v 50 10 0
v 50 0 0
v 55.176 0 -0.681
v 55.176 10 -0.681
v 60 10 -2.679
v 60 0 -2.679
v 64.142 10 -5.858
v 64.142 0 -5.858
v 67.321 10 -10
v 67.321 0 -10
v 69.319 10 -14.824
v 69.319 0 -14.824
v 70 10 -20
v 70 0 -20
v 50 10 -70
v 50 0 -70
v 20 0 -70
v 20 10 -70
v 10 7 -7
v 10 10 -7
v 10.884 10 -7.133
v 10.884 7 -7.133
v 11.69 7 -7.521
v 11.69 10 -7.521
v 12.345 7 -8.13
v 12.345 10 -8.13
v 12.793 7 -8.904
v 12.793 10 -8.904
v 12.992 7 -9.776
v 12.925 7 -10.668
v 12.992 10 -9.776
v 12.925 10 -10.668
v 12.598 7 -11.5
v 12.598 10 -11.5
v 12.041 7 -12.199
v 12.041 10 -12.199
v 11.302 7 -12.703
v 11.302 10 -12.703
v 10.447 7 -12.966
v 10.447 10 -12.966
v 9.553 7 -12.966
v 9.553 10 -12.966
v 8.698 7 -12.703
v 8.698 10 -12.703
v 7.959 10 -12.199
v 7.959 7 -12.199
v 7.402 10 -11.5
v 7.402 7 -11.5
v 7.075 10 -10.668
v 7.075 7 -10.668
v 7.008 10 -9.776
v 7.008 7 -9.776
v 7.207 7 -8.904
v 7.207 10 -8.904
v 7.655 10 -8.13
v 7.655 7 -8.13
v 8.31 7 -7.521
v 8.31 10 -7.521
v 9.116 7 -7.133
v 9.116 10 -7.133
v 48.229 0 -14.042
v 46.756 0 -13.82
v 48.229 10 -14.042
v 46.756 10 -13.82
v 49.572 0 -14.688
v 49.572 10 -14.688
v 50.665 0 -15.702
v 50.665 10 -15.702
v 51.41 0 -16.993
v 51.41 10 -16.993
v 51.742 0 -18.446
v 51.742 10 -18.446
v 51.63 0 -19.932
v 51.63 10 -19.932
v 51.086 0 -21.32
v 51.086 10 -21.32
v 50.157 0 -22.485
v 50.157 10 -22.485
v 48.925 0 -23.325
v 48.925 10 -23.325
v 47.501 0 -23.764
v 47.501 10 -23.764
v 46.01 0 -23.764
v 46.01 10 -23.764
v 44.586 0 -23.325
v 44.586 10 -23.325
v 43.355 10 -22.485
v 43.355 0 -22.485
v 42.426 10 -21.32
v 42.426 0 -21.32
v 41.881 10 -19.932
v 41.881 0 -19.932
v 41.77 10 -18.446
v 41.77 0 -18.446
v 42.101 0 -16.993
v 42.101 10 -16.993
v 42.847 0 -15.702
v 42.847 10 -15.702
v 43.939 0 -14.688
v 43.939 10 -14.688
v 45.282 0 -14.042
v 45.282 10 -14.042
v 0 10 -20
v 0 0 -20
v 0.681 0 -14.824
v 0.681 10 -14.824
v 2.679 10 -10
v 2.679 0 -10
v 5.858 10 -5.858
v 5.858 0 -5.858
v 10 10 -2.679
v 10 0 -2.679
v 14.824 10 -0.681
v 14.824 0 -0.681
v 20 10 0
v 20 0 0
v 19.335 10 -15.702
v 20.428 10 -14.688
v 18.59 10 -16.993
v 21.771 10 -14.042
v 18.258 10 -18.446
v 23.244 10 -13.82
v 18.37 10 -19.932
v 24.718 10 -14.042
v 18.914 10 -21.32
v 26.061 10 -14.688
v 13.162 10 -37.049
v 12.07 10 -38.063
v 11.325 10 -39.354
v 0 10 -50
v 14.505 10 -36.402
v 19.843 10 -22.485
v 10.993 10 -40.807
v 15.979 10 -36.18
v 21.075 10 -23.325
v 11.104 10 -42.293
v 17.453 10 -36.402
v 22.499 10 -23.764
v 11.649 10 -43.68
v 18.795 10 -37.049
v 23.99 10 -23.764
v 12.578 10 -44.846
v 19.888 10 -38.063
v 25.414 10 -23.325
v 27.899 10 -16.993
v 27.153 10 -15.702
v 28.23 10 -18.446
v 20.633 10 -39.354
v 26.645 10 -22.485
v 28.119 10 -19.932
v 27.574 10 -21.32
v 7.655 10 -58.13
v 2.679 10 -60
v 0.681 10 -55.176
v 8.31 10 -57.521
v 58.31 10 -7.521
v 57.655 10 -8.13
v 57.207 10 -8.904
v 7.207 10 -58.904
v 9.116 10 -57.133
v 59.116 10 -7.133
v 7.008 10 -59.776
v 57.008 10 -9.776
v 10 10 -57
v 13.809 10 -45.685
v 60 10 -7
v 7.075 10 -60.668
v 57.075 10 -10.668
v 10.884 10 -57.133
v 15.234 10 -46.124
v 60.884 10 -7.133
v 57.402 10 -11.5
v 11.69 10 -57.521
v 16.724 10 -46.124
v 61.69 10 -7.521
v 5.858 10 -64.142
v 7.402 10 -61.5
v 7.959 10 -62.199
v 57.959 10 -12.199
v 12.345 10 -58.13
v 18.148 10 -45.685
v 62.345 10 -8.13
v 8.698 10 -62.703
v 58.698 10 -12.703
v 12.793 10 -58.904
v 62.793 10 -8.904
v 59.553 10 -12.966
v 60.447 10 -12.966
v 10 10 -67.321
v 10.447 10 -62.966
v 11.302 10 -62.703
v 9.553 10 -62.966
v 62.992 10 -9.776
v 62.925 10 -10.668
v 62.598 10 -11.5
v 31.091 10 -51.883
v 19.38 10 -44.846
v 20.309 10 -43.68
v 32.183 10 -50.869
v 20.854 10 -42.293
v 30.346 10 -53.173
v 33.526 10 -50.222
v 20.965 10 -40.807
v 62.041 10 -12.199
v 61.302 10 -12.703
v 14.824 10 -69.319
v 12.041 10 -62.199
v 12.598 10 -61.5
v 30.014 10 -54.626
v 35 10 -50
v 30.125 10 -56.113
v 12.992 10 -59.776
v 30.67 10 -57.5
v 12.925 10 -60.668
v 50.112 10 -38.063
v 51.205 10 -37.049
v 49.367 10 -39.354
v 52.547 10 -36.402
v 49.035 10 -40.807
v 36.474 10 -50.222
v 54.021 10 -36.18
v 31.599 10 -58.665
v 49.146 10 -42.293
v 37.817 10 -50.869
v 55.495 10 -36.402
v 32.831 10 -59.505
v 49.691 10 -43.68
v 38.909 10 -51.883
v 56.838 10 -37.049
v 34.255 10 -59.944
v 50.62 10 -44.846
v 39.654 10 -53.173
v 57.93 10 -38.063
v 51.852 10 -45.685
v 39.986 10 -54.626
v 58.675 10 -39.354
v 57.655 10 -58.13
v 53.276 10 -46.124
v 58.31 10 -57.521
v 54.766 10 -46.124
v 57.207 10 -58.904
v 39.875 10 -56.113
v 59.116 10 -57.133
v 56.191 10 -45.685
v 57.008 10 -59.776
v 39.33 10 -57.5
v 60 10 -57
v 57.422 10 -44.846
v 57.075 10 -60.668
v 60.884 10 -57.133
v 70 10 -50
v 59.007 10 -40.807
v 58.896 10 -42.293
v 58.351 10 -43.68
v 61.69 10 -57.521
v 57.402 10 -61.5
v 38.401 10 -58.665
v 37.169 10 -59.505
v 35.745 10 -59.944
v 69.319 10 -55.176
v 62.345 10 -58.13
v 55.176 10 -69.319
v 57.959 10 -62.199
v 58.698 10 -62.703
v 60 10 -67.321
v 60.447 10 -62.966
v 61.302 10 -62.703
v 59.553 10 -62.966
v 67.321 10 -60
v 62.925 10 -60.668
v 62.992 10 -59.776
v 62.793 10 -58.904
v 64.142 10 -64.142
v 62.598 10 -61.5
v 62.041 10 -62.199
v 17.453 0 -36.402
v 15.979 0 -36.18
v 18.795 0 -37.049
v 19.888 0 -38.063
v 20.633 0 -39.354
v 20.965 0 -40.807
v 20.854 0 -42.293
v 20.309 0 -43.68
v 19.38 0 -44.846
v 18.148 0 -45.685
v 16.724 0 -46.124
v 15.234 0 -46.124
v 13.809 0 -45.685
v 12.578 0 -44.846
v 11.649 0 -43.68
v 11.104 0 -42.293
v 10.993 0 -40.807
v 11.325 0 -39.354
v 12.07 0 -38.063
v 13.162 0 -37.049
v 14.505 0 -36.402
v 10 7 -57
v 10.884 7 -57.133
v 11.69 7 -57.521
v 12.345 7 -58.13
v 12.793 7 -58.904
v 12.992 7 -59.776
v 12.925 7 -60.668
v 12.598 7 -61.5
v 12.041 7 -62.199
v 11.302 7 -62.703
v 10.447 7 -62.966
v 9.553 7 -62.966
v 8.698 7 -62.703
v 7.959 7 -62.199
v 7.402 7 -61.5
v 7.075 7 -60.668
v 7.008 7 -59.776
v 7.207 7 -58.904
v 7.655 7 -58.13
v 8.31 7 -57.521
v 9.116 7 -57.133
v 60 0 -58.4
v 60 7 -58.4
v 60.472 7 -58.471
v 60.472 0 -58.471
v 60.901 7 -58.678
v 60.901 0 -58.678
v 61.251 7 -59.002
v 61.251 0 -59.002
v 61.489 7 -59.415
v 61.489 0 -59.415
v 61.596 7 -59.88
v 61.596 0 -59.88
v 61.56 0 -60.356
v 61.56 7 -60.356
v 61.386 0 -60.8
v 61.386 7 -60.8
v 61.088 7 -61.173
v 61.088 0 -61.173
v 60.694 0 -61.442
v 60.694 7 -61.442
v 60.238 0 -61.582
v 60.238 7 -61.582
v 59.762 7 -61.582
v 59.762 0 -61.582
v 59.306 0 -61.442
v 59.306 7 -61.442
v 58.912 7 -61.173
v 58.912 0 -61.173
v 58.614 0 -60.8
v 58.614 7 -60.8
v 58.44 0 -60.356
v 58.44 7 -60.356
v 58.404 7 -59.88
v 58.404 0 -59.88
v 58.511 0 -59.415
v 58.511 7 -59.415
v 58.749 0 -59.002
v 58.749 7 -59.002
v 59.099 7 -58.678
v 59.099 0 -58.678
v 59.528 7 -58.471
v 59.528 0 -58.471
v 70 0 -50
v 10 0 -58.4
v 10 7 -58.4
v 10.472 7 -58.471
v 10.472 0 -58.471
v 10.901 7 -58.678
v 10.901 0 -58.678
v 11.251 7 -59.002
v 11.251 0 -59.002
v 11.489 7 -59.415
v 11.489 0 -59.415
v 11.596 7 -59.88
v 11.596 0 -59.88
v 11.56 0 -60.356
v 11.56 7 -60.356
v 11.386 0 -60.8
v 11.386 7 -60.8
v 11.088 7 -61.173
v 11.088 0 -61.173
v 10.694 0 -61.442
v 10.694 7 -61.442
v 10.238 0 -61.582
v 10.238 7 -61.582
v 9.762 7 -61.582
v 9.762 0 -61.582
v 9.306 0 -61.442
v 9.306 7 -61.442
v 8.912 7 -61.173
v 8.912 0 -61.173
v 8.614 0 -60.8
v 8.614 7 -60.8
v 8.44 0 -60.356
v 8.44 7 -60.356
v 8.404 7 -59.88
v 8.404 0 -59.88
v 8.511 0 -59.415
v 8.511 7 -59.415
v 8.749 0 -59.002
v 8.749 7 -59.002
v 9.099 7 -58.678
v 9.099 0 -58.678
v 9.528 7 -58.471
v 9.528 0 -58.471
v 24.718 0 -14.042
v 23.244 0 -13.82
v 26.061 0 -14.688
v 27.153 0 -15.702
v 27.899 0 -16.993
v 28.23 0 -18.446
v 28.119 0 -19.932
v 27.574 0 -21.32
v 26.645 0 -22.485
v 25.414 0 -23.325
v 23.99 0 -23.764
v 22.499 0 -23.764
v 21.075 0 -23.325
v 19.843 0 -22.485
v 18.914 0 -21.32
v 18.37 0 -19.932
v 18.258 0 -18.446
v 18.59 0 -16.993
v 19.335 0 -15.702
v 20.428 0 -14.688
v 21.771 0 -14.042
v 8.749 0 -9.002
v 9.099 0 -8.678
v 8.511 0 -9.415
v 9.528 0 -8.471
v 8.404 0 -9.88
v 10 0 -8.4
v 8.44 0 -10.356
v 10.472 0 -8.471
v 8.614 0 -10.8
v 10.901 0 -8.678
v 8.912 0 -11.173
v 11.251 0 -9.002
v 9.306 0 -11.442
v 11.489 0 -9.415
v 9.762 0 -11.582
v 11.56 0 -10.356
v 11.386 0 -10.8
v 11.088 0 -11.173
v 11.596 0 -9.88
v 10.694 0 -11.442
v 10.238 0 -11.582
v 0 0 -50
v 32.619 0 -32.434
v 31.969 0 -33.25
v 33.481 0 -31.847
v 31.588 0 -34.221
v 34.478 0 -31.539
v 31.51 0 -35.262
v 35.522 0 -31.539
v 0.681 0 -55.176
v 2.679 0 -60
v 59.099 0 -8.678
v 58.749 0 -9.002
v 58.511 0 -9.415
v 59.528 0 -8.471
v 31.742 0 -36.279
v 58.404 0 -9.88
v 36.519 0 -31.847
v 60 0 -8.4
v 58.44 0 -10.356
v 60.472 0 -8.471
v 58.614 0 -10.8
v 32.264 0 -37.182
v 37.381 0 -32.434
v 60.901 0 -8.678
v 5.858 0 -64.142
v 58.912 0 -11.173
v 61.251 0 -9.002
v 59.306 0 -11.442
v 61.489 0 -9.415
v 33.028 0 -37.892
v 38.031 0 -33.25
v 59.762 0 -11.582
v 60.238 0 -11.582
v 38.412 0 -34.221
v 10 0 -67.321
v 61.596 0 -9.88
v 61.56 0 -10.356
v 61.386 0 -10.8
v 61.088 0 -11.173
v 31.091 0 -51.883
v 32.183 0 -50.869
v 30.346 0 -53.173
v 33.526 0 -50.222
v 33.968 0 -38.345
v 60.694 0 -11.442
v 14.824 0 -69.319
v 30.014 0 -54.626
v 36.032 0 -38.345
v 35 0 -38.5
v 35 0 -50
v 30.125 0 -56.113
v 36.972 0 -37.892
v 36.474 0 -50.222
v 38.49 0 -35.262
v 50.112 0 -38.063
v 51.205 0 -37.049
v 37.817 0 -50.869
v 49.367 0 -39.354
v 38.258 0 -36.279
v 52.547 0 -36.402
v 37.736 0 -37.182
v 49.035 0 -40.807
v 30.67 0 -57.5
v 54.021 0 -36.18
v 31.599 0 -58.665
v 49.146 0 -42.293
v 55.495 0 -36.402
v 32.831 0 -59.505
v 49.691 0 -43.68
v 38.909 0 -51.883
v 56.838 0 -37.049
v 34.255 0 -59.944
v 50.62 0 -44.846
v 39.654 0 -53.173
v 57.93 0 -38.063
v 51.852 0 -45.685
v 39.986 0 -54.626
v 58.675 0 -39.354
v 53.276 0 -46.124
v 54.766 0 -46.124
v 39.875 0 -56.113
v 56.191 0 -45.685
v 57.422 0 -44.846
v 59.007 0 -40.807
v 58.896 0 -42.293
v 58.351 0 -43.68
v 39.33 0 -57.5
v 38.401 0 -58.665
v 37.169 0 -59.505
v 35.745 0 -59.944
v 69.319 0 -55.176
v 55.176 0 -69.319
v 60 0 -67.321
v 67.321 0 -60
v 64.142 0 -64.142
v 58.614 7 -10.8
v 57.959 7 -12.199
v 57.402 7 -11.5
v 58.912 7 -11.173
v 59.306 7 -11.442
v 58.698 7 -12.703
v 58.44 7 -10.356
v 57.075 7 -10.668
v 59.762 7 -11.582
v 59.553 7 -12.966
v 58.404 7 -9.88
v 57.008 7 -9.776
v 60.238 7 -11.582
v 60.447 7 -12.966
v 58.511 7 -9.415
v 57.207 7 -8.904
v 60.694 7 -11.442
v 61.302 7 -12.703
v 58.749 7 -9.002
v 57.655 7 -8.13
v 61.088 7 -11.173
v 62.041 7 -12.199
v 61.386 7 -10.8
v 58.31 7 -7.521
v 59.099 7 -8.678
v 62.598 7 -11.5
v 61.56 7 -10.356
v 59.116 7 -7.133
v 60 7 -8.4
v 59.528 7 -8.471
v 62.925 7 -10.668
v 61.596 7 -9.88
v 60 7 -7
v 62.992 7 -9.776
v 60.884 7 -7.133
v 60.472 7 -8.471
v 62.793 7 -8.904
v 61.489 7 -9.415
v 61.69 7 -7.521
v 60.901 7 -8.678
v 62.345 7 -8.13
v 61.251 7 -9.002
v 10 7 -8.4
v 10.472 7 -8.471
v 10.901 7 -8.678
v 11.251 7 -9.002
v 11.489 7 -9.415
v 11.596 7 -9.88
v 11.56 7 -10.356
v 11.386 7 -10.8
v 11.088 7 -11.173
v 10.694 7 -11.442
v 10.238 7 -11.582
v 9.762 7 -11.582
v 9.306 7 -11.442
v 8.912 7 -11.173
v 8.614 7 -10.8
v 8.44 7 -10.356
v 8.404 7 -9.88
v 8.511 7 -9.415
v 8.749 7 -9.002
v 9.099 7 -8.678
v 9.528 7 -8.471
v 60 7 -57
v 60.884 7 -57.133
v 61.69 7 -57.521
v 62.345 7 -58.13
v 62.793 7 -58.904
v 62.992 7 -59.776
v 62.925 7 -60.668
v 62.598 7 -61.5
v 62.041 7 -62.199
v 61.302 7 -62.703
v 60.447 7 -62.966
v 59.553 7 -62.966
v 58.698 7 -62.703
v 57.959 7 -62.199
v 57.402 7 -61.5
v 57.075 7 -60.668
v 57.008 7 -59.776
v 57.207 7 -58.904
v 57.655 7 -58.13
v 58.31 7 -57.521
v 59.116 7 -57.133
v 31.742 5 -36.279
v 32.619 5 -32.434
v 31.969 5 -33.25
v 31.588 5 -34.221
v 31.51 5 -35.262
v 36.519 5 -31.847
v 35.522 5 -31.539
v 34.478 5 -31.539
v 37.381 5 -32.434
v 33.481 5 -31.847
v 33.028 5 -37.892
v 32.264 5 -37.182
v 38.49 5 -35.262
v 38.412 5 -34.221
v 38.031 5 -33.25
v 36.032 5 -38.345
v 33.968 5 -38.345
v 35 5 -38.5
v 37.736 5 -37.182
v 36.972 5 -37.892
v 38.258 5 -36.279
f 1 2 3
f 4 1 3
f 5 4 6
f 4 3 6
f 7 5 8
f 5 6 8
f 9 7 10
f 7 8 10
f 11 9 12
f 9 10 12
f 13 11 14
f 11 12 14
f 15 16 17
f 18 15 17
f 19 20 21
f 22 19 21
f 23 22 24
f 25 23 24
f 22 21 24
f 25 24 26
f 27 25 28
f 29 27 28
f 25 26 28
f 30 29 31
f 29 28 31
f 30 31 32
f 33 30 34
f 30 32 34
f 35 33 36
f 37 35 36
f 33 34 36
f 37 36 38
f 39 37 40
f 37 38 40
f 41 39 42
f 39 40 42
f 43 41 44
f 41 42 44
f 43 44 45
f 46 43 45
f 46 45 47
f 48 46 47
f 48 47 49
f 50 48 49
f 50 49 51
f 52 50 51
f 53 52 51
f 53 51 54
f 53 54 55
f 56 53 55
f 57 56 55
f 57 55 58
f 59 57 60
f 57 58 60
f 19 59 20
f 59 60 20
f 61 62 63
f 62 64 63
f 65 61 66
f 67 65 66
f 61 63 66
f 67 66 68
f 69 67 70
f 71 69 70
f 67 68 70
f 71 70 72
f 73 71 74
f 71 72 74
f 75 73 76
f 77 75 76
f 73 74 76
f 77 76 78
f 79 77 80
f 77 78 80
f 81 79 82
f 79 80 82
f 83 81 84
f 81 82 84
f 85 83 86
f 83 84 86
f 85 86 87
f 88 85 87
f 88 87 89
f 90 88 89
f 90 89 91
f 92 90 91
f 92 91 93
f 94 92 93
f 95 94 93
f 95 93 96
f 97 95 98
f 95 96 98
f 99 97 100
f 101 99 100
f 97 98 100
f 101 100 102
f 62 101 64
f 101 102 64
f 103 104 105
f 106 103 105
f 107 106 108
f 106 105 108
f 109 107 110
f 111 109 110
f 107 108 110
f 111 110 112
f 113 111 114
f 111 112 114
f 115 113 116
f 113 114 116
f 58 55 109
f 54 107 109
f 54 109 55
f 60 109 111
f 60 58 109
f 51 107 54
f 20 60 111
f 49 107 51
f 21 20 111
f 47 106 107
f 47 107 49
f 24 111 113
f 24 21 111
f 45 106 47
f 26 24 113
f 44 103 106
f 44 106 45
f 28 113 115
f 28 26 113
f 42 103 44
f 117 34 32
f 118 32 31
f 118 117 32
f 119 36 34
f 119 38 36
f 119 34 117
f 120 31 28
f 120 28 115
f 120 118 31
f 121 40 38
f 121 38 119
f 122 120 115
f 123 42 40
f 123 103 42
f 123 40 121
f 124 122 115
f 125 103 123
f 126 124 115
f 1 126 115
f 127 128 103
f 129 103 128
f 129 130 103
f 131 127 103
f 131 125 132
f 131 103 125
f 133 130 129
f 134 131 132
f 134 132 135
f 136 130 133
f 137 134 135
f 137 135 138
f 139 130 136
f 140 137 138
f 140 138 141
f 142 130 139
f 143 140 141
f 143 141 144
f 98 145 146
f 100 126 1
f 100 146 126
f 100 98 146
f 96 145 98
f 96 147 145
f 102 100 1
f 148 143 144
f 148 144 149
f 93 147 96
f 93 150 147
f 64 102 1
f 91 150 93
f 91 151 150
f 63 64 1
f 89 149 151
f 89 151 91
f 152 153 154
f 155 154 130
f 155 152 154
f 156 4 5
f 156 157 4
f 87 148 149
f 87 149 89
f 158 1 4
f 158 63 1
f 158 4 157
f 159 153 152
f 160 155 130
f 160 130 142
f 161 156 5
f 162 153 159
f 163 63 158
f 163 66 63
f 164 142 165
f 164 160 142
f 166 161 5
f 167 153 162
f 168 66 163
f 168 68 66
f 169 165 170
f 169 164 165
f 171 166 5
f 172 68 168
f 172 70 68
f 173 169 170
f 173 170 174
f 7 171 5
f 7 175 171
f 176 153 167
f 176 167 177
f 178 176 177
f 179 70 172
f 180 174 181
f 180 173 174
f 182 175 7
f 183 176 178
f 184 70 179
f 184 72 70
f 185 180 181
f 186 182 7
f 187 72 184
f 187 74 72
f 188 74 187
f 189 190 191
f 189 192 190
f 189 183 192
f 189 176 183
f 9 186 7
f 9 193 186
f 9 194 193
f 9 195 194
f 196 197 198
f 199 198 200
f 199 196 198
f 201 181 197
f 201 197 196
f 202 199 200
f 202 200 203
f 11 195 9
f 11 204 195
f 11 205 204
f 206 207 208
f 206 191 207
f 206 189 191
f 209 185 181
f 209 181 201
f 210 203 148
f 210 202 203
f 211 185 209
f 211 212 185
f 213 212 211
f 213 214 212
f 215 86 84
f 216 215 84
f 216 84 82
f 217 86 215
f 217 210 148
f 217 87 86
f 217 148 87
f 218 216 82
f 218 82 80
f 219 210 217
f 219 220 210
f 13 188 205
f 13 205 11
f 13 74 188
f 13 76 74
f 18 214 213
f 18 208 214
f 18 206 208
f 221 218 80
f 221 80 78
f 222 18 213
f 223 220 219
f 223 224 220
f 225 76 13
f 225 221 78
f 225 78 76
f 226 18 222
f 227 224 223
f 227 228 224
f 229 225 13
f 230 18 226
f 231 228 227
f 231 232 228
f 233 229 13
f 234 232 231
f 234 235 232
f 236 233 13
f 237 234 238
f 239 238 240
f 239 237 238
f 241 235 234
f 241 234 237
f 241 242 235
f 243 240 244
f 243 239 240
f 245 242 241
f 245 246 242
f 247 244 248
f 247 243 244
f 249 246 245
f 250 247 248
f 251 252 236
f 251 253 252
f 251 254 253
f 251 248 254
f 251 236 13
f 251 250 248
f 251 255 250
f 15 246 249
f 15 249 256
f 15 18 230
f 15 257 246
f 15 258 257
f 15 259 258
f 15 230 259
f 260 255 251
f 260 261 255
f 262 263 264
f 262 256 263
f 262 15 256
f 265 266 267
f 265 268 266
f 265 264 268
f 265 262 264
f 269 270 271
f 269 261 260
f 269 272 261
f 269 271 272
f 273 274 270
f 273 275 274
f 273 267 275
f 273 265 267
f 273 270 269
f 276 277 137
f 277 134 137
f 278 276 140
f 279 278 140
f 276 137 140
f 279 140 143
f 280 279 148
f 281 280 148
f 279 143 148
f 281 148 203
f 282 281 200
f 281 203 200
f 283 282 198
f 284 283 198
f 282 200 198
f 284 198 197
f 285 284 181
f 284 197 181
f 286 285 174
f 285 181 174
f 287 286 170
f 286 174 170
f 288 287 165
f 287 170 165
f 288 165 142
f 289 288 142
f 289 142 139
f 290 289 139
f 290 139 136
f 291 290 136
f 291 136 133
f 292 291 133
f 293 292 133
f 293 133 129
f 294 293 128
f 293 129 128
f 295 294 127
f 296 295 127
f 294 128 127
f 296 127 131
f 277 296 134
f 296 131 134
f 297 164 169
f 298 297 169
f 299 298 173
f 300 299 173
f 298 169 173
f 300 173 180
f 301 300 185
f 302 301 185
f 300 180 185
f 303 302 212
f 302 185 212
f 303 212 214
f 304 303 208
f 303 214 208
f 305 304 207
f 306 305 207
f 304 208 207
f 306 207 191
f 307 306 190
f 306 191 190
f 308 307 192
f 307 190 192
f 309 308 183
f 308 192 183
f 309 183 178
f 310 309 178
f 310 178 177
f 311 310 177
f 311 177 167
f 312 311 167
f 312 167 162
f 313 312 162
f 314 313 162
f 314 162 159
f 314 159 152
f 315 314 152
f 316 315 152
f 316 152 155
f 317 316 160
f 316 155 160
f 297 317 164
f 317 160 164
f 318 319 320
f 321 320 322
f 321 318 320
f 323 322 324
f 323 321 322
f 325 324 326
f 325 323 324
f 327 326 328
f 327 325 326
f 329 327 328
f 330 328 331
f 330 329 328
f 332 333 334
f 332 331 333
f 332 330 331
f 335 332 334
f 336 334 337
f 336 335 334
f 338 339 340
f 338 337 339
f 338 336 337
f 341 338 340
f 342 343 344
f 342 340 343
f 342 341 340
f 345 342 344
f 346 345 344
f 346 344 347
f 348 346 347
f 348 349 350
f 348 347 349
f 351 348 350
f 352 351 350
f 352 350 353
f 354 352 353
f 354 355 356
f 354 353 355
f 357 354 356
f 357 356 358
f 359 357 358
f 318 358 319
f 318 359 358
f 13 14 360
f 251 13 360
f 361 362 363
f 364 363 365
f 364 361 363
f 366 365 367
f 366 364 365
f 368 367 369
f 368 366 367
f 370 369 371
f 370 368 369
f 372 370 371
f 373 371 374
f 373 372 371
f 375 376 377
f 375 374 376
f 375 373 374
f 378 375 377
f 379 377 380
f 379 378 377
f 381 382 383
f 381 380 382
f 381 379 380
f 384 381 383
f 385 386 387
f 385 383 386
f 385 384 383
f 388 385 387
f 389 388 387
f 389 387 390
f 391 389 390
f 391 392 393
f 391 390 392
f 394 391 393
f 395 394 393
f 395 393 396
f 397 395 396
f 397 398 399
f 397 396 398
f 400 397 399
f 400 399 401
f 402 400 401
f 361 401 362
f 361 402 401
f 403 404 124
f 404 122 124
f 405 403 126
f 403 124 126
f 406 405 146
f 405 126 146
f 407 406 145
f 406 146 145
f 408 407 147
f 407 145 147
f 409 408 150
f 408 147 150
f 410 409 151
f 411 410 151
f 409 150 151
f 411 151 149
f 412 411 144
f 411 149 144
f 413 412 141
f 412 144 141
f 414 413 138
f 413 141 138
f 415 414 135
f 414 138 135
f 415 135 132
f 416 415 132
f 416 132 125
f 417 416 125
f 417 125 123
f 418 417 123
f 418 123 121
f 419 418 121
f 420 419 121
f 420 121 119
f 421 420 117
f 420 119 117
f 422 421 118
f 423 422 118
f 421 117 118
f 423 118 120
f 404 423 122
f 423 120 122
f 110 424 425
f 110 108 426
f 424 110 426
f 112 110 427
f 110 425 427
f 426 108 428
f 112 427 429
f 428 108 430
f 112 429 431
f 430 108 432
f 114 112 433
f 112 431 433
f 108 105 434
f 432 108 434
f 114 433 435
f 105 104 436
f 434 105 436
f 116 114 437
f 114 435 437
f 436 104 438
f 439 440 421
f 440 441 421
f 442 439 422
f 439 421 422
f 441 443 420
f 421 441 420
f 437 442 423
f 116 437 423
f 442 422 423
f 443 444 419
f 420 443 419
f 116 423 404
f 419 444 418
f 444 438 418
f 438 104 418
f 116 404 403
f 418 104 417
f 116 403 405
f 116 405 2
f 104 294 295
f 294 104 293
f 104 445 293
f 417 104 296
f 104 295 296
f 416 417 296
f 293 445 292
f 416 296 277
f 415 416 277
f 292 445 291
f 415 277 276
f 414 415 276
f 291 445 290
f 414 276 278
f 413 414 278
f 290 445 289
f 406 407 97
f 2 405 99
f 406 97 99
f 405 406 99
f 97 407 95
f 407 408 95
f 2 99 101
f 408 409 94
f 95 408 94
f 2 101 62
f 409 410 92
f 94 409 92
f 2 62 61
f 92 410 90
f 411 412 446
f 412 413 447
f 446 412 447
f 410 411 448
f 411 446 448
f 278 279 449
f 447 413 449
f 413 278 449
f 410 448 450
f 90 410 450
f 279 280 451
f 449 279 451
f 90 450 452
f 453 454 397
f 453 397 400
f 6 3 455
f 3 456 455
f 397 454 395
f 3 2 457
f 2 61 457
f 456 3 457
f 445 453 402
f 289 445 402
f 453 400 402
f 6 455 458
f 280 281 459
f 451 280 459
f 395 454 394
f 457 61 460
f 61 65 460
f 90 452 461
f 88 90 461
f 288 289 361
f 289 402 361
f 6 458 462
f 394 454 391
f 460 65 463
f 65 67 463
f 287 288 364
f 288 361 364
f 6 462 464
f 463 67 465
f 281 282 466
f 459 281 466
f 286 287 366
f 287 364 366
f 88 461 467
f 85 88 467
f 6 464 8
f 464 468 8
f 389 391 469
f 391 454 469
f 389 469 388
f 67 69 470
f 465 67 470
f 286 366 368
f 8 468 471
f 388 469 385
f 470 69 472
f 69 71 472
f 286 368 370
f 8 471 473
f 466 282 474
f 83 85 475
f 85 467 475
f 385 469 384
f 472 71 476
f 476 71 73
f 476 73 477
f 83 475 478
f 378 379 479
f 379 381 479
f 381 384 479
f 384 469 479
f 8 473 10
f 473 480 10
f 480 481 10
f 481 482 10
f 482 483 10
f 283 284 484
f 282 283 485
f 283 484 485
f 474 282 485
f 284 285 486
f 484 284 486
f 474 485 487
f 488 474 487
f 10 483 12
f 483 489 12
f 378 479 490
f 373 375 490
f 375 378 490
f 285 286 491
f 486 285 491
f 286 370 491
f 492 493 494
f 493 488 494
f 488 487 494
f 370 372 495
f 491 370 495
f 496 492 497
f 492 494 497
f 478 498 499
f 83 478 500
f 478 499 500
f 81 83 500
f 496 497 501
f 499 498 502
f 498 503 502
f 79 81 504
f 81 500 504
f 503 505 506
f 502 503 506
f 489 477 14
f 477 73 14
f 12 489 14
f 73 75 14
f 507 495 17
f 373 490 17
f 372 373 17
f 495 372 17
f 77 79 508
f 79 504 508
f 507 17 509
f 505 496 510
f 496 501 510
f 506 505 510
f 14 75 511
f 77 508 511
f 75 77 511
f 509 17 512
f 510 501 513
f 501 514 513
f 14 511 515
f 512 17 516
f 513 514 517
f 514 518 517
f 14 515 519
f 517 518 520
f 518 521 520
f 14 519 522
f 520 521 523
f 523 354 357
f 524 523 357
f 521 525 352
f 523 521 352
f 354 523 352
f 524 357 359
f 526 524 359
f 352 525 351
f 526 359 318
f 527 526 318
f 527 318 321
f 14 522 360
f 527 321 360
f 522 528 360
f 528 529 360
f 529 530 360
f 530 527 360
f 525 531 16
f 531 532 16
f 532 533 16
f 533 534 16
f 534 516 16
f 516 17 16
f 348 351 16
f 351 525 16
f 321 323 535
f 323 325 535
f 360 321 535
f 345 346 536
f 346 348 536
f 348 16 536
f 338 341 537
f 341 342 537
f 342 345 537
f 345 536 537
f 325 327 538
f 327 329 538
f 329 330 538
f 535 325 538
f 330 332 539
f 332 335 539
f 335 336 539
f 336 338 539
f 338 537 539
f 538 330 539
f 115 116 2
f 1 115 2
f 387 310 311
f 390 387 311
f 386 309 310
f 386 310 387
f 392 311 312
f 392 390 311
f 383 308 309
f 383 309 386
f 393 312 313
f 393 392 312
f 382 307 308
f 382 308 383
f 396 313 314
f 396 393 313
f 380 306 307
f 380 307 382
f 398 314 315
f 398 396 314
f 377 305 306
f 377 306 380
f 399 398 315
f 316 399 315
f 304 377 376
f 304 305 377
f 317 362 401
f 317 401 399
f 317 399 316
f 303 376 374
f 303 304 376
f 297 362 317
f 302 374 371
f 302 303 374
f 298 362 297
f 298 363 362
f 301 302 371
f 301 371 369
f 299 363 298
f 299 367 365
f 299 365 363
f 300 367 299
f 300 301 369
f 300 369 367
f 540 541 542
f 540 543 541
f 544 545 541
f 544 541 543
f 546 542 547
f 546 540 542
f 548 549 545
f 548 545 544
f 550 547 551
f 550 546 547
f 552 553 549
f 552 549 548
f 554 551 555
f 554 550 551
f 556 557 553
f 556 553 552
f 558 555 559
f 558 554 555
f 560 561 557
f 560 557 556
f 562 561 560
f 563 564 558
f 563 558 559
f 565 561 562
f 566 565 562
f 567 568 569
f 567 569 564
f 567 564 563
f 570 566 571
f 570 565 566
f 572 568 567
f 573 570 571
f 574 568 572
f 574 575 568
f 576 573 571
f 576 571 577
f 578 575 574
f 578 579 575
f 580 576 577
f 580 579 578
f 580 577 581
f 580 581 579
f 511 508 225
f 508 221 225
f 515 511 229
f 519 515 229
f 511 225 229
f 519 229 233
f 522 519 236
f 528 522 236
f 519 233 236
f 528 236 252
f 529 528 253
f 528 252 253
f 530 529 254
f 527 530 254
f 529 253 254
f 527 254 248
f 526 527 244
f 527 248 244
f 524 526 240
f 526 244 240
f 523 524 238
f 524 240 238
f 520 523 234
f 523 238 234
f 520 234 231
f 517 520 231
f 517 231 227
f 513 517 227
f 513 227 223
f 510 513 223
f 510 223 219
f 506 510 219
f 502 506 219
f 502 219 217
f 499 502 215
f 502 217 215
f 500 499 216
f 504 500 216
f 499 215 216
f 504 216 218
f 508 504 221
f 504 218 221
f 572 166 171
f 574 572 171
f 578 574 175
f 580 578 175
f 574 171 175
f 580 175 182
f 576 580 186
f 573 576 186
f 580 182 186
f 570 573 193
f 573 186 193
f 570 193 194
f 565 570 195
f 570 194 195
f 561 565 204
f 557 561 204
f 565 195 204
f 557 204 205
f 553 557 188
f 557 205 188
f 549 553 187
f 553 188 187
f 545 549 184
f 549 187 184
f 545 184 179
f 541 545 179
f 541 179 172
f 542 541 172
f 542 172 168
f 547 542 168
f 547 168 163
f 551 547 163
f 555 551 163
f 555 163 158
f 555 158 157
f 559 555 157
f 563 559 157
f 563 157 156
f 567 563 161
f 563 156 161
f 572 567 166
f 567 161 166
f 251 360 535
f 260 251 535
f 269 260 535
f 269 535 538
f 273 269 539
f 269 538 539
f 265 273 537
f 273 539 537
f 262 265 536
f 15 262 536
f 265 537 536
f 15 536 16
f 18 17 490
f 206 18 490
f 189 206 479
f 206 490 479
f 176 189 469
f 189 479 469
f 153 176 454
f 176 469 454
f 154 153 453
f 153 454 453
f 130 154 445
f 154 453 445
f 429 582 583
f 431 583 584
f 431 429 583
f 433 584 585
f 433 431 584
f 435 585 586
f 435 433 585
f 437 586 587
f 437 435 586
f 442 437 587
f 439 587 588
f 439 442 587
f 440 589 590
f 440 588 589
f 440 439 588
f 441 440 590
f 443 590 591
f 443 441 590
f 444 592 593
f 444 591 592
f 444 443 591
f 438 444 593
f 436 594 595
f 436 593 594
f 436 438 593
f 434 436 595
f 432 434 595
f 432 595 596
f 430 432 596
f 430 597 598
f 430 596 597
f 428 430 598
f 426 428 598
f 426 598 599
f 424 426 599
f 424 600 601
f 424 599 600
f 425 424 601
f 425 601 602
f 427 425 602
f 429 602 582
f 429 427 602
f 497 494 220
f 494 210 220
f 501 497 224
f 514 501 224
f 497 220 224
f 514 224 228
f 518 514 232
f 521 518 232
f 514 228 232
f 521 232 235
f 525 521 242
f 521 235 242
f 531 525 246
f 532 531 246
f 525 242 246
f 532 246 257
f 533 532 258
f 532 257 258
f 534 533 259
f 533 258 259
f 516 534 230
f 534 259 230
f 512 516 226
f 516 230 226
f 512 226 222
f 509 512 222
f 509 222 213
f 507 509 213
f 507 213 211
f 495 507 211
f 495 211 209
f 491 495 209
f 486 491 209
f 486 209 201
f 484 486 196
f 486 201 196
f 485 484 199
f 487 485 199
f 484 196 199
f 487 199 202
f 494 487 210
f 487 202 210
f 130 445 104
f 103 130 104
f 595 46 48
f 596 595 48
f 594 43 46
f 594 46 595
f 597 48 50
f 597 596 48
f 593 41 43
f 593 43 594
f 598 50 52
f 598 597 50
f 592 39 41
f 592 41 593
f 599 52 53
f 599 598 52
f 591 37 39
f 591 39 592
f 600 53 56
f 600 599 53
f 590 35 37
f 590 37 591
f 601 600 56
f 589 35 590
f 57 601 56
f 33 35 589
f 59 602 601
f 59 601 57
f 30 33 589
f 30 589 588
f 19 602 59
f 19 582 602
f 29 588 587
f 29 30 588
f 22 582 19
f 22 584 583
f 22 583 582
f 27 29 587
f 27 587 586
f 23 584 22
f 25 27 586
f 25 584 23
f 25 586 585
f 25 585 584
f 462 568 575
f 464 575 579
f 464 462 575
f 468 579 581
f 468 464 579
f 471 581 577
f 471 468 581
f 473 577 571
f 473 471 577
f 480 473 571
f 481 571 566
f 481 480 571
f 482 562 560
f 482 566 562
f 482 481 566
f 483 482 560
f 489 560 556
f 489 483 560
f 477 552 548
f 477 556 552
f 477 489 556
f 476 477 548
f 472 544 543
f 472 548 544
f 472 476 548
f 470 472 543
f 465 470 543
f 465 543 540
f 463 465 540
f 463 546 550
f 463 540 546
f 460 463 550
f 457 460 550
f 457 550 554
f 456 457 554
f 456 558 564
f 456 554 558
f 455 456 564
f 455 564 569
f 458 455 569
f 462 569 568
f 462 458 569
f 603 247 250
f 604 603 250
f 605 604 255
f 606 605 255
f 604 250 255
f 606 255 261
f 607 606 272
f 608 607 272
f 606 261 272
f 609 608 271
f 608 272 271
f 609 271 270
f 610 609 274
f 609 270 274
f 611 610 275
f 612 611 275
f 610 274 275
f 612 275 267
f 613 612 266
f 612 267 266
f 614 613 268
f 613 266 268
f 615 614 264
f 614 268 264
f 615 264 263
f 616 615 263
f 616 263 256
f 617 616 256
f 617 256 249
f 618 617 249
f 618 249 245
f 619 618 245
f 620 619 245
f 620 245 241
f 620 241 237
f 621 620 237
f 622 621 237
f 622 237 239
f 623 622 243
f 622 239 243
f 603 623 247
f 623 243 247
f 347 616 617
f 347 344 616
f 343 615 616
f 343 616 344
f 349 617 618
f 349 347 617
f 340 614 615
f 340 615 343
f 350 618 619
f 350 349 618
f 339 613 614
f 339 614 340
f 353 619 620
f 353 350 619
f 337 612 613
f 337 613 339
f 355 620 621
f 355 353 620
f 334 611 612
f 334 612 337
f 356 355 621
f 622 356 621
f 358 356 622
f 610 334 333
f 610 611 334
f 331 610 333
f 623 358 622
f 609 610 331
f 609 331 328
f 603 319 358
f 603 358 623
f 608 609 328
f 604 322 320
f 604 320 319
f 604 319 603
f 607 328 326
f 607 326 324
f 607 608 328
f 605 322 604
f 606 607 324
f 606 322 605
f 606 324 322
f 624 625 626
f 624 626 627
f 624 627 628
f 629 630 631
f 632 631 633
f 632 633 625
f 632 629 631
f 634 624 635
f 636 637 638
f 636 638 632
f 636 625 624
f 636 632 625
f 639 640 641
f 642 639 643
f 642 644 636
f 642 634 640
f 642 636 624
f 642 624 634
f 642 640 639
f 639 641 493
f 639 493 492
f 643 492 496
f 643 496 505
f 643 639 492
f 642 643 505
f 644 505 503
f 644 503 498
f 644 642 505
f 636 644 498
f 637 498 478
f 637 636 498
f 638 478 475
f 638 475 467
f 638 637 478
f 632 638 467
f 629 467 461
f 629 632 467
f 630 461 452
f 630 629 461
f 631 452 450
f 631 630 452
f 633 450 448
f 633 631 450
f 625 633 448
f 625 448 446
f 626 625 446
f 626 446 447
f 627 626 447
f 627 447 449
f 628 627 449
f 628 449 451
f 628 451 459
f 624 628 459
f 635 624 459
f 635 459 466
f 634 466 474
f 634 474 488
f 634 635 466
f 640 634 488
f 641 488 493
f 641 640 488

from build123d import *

# Parameters (mm, degrees)
SKETCH_1_R          = 1.6
EXTRUDE_1_DEPTH     = 10
SKETCH_2_R          = 5
CUT_EXTRUDE_1_DEPTH = 25
SKETCH_3_R          = 3
CUT_EXTRUDE_2_DEPTH = 3
CUT_EXTRUDE_START   = -5
SKETCH_4_R          = 5
SKETCH_4_R_2        = 3.5
CUT_EXTRUDE_3_DEPTH = 5


with BuildPart() as part:
    # 草图1 → 凸台-拉伸1 (new body)
    with BuildSketch(Plane(origin=(0, 0, 0), x_dir=(1, 0, 0), z_dir=(0, 1, 0))):
        with BuildLine():
            Line((20, 0), (50, 0))
            ThreePointArc((50, 0), (64.142135624, 5.857864376), (70, 20))
            Line((70, 20), (70, 50))
            ThreePointArc((70, 50), (64.142135624, 64.142135624), (50, 70))
            Line((50, 70), (20, 70))
            ThreePointArc((20, 70), (5.857864376, 64.142135624), (0, 50))
            Line((0, 50), (0, 20))
            ThreePointArc((0, 20), (5.857864376, 5.857864376), (20, 0))
        make_face()
        with Locations(Location((10, 60, 0), (0, 0, 270))):
            Circle(SKETCH_1_R, mode=Mode.SUBTRACT)
        with Locations(Location((60, 60, 0), (0, 0, 270))):
            Circle(SKETCH_1_R, mode=Mode.SUBTRACT)
        with Locations(Location((60, 10, 0), (0, 0, 270))):
            Circle(SKETCH_1_R, mode=Mode.SUBTRACT)
        with Locations(Location((10, 10, 0), (0, 0, 270))):
            Circle(SKETCH_1_R, mode=Mode.SUBTRACT)
    extrude(amount=EXTRUDE_1_DEPTH)

    # 草图2 → 切除-拉伸1 (cut)
    with BuildSketch(Plane(origin=(0, 10, 0), x_dir=(1, 0, 0), z_dir=(0, 1, 0))):
        with Locations(Location((35, 55, 0), (0, 0, 270))):
            Circle(SKETCH_2_R)
        with Locations(Location((54.021130326, 41.180339888, 0), (0, 0, 270))):
            Circle(SKETCH_2_R)
        with Locations(Location((46.755705046, 18.819660113, 0), (0, 0, 270))):
            Circle(SKETCH_2_R)
        with Locations(Location((23.244294954, 18.819660112, 0), (0, 0, 270))):
            Circle(SKETCH_2_R)
        with Locations(Location((15.978869674, 41.180339887, 0), (0, 0, 270))):
            Circle(SKETCH_2_R)
    extrude(amount=-CUT_EXTRUDE_1_DEPTH, mode=Mode.SUBTRACT)

    # 草图3 → 切除-拉伸2 (cut)
    with BuildSketch(Plane(origin=(0, 10, 0), x_dir=(1, 0, 0), z_dir=(0, 1, 0))):
        with Locations(Location((10, 60, 0), (0, 0, 270))):
            Circle(SKETCH_3_R)
        with Locations(Location((60, 60, 0), (0, 0, 270))):
            Circle(SKETCH_3_R)
        with Locations(Location((60, 10, 0), (0, 0, 270))):
            Circle(SKETCH_3_R)
        with Locations(Location((10, 10, 0), (0, 0, 270))):
            Circle(SKETCH_3_R)
    extrude(amount=-CUT_EXTRUDE_2_DEPTH, mode=Mode.SUBTRACT)

    # 草图4 → 切除-拉伸3 (cut)
    with BuildSketch(Plane.XZ.offset(CUT_EXTRUDE_START)):
        with Locations(Location((15.978869674, -41.180339887, 0), (0, 0, 90))):
            Circle(SKETCH_4_R)
        with Locations(Location((35, -55, 0), (0, 0, 90))):
            Circle(SKETCH_4_R)
        with Locations(Location((54.021130326, -41.180339888, 0), (0, 0, 90))):
            Circle(SKETCH_4_R)
        with Locations(Location((46.755705046, -18.819660113, 0), (0, 0, 90))):
            Circle(SKETCH_4_R)
        with Locations(Location((23.244294954, -18.819660112, 0), (0, 0, 90))):
            Circle(SKETCH_4_R)
        with Locations(Location((35, -35, 0), (0, 0, 270))):
            Circle(SKETCH_4_R_2)
    extrude(amount=CUT_EXTRUDE_3_DEPTH, mode=Mode.SUBTRACT)


solid = part.part
